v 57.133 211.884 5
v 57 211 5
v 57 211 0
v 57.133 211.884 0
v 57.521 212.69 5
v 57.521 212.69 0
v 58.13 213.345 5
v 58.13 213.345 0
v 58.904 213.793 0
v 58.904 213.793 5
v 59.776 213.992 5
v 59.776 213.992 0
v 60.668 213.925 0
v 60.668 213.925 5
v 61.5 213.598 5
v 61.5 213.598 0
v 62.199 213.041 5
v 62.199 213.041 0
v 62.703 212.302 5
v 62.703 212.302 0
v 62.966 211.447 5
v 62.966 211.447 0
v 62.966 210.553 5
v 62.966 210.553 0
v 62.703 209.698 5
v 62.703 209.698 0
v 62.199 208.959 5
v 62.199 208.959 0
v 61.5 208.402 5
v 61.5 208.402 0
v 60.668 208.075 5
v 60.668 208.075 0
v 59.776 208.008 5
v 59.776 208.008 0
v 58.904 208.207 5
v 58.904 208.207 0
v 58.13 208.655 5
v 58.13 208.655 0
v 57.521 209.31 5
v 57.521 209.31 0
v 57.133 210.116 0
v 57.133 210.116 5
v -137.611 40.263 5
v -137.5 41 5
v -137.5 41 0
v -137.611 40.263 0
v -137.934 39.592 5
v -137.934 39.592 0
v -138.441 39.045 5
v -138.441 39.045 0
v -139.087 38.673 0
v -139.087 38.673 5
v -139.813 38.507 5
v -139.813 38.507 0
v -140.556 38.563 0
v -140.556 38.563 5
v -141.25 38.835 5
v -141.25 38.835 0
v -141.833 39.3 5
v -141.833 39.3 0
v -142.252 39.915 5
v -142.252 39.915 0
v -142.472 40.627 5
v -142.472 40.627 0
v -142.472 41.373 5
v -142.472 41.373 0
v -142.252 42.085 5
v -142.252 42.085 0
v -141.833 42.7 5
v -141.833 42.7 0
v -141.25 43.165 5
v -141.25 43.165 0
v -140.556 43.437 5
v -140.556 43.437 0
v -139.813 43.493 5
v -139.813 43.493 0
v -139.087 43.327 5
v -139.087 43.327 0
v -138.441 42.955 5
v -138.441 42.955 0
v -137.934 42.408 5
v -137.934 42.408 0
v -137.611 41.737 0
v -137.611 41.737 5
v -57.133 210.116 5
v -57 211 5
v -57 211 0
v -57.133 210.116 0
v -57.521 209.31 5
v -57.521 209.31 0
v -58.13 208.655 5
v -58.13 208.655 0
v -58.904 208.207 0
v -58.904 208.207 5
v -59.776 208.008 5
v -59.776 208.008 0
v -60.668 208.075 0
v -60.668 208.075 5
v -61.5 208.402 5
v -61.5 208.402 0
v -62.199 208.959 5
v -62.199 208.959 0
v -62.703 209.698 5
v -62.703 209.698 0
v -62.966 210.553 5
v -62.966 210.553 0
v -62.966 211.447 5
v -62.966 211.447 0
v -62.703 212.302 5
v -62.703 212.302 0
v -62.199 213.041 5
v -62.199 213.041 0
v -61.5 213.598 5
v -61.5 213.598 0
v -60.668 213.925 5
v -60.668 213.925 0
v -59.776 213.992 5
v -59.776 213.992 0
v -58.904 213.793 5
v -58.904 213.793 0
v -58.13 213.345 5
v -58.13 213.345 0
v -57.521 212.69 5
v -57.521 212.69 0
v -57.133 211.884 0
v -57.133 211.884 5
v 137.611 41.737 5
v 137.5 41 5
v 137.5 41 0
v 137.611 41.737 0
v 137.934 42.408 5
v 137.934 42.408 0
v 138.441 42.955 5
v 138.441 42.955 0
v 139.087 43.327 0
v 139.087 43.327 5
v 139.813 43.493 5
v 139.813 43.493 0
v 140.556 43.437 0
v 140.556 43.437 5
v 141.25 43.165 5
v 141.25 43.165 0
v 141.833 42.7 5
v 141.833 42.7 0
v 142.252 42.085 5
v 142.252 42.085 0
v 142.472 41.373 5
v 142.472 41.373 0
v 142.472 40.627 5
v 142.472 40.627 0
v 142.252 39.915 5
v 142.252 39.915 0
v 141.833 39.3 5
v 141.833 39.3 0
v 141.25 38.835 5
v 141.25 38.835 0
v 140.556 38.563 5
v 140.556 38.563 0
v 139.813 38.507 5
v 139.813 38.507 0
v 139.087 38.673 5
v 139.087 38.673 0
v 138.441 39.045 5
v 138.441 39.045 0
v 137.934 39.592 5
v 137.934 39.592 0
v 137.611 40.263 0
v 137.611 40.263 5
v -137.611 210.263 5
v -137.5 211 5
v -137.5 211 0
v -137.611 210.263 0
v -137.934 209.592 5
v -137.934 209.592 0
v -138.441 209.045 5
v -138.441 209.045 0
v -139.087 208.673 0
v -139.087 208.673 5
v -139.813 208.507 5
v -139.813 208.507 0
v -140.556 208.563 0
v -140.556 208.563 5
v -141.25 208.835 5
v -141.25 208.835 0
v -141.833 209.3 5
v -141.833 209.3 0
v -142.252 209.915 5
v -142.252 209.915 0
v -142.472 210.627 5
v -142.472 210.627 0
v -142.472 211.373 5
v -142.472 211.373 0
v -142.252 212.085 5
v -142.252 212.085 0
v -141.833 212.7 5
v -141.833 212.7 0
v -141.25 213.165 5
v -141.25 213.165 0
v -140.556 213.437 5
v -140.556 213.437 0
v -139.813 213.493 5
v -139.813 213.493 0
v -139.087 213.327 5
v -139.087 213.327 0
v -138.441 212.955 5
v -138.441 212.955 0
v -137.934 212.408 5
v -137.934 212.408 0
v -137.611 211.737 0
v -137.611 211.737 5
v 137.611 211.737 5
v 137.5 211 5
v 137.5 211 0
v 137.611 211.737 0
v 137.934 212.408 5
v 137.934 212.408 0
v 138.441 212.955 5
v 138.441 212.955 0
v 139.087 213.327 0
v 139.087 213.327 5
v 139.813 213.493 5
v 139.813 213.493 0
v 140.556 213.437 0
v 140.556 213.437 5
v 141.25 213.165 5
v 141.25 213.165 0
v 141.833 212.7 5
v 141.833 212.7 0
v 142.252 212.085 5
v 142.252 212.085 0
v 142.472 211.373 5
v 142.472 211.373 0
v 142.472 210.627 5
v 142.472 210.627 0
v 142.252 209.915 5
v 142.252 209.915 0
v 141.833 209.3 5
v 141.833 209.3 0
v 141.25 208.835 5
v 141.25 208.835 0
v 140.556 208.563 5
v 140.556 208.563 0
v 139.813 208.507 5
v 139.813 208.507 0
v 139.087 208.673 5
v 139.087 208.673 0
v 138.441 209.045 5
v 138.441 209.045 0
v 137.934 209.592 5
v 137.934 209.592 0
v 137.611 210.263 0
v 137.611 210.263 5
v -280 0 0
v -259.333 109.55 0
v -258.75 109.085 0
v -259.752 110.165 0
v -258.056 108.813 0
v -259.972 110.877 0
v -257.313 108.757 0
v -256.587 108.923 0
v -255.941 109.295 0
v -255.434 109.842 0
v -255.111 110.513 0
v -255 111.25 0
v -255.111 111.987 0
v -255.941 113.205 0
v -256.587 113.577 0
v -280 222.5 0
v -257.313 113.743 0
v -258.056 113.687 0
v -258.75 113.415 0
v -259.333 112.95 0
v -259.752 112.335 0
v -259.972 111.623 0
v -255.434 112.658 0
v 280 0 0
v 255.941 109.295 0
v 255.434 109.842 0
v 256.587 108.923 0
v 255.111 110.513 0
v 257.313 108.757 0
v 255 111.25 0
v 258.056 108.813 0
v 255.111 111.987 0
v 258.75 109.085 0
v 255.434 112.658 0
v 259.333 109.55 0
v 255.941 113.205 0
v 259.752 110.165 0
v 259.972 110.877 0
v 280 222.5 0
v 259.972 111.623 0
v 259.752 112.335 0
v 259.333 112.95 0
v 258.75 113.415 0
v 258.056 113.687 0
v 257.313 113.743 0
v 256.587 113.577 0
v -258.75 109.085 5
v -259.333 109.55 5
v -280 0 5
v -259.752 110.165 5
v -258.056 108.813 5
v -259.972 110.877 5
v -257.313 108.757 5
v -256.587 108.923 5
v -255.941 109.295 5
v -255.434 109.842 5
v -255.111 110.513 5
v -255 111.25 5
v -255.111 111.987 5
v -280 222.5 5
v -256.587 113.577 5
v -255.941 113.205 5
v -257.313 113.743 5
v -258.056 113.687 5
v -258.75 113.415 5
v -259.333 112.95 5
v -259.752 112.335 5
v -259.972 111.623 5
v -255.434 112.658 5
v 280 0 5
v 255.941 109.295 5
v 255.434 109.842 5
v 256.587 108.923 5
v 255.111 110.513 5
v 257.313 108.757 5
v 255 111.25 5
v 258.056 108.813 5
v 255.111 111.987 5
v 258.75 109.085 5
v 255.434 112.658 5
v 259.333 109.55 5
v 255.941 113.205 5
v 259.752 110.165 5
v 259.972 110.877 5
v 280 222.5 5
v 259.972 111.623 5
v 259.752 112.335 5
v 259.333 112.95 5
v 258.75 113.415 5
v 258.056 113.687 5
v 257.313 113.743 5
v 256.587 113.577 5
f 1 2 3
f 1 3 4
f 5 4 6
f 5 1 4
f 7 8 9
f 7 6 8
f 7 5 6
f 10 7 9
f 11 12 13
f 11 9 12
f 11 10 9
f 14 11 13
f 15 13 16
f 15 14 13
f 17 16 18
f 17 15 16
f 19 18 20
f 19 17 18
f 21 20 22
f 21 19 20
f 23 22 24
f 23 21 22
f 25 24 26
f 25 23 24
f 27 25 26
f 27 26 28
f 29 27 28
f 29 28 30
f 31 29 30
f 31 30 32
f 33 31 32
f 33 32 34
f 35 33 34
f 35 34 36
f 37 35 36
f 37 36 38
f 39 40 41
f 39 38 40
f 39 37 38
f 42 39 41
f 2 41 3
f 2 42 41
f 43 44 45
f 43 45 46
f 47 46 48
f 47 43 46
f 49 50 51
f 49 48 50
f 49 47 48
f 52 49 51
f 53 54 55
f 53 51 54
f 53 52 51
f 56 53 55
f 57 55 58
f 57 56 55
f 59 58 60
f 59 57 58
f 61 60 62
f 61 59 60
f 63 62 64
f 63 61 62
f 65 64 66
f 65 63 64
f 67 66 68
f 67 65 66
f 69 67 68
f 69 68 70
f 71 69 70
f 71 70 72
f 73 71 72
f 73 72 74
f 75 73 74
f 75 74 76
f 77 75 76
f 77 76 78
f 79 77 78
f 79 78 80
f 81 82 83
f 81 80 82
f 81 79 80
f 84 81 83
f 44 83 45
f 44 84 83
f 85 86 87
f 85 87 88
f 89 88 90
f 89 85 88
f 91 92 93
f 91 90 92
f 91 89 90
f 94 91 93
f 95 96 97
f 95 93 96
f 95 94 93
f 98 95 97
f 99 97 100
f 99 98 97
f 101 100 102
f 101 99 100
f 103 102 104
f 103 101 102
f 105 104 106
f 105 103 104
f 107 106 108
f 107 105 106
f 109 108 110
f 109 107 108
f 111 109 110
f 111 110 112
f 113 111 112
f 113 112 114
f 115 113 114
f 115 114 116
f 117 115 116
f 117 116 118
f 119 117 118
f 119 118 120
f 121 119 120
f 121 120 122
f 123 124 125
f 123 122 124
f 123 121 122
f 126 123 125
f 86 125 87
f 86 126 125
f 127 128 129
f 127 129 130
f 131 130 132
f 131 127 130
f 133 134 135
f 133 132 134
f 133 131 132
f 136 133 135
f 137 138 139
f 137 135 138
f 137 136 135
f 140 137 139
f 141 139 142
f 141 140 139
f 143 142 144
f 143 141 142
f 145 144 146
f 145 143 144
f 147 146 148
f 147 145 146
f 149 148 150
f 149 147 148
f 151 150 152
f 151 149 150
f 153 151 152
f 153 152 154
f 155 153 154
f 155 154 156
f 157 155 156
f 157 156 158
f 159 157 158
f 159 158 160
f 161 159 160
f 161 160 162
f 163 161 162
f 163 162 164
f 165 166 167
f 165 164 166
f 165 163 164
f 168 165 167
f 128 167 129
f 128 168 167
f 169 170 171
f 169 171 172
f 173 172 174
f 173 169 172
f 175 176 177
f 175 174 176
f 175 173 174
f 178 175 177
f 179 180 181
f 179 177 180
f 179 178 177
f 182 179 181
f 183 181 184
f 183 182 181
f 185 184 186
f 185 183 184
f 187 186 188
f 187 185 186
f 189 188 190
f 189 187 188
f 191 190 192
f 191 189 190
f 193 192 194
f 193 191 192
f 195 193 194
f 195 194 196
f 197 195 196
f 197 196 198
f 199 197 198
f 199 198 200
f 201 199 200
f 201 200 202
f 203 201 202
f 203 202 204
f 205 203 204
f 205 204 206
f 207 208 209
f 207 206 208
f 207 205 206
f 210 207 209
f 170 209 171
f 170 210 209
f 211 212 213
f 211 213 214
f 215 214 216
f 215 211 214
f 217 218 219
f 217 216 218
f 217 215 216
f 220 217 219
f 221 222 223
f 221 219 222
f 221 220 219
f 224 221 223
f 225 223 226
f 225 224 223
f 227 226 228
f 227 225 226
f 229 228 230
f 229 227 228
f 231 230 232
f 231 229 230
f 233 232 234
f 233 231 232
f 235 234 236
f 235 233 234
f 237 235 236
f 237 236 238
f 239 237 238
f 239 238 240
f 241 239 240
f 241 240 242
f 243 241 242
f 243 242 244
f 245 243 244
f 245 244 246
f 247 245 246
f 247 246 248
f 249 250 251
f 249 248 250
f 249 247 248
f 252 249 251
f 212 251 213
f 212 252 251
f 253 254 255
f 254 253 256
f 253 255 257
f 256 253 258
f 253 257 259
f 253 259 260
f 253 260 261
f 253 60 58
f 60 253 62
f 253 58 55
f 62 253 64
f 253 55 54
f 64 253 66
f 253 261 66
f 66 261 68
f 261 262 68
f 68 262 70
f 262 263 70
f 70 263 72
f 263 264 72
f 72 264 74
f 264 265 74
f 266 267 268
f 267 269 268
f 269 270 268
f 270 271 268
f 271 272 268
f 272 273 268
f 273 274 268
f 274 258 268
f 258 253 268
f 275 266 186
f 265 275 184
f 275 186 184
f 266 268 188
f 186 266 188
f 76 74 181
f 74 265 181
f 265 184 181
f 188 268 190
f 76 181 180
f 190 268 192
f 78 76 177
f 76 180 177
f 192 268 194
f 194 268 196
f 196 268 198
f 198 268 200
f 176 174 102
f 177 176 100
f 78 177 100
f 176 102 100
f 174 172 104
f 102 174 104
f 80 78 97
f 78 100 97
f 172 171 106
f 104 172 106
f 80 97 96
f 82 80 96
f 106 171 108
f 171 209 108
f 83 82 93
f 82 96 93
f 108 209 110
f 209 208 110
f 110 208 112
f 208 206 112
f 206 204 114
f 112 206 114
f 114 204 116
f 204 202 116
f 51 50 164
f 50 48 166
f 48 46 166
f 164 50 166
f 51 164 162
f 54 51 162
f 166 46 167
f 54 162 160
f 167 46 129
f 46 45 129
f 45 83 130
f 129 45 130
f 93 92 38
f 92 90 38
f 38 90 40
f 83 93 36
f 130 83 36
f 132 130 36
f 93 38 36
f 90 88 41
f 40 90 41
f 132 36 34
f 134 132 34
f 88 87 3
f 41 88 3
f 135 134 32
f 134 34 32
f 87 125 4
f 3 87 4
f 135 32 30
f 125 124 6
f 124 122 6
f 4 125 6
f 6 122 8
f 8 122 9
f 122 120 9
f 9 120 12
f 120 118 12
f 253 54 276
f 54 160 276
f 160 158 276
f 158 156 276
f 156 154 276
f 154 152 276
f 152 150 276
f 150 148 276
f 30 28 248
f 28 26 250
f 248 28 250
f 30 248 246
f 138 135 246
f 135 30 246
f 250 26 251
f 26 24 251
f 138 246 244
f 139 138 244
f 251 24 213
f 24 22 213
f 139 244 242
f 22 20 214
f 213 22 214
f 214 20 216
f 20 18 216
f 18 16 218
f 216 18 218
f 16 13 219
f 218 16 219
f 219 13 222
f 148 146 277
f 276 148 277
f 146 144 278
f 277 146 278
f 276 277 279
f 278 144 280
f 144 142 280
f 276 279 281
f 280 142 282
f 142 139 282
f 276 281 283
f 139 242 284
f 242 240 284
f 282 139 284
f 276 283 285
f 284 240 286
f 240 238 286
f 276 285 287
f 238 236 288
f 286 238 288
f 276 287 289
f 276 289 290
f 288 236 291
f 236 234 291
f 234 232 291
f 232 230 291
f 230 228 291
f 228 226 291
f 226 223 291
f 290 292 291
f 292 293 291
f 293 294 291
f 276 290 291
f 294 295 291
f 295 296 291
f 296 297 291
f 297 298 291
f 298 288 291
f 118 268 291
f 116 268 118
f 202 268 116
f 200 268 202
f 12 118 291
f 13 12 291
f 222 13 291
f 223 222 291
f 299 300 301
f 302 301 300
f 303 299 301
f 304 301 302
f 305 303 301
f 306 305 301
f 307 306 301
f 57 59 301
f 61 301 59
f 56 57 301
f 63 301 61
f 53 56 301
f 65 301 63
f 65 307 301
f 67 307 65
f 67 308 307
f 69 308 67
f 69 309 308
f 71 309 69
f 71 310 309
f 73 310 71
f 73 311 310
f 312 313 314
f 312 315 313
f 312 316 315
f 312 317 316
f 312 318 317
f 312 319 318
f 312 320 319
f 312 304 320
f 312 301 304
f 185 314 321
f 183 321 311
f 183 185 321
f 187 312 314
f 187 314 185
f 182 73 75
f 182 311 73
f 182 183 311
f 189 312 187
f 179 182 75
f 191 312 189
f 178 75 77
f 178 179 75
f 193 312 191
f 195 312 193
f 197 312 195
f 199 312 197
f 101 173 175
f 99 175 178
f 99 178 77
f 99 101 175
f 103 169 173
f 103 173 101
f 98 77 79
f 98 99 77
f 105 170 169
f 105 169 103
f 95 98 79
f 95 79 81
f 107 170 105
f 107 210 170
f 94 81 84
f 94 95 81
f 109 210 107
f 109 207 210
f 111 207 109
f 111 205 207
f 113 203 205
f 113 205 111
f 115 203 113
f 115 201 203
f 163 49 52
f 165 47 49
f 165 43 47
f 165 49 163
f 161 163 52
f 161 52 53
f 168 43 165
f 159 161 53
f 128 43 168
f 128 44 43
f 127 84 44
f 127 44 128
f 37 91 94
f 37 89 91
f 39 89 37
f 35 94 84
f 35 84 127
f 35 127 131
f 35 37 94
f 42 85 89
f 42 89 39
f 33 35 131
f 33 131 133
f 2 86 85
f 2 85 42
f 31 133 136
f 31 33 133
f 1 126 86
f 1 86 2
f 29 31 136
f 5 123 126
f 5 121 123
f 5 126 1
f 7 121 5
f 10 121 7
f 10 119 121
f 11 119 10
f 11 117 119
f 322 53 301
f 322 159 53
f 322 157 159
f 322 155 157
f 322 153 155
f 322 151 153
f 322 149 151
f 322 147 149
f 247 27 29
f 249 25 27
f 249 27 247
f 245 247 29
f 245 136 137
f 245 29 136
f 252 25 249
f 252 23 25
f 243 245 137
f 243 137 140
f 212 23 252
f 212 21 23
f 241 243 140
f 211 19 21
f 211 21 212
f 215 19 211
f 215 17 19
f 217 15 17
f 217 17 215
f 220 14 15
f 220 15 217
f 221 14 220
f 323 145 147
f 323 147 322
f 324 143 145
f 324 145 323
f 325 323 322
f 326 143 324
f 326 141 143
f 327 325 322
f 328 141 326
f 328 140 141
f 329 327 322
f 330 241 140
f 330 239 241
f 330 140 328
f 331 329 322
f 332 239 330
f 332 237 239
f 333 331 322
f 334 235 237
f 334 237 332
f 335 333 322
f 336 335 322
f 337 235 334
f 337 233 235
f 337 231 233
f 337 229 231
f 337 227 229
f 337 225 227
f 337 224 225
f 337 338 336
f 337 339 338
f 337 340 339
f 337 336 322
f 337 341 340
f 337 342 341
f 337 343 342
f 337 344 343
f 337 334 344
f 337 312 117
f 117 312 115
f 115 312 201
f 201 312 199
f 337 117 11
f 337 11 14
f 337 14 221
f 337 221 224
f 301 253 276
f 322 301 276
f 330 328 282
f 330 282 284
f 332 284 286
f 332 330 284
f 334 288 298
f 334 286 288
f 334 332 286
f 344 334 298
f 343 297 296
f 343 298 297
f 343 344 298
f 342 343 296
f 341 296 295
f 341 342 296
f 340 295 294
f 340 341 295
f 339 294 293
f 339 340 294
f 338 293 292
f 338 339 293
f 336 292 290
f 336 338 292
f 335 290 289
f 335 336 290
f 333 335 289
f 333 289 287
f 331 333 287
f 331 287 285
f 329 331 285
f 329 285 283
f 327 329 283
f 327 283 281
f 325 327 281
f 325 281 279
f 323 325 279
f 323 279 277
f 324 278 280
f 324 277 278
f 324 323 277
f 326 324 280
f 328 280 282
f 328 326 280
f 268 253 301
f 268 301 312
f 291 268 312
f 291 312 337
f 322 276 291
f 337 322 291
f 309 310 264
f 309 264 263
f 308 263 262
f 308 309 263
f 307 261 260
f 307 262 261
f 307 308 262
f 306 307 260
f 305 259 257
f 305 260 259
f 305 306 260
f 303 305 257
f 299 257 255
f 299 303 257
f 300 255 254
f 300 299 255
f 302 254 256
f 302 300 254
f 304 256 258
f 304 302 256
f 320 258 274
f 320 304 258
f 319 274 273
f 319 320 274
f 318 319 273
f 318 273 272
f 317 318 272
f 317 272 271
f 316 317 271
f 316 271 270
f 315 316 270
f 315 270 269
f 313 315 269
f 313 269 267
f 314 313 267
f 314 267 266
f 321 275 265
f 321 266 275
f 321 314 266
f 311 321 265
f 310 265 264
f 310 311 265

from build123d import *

# Parameters (mm, degrees)
SKETCH_1_W               = 560
SKETCH_1_H               = 222.5
EXTRUDE_1_DEPTH          = 5
CUT_EXTRUDE_3_DEPTH      = 358.674782449
CUT_EXTRUDE_3_DEPTH_BACK = 358.674782449
SKETCH_4_R               = 2.5
SKETCH_4_R_2             = 3


with BuildPart() as part:
    # 草图1 → 凸台-拉伸1 (new body)
    with BuildSketch(Plane.XY):
        with Locations((0, 111.25)):
            Rectangle(SKETCH_1_W, SKETCH_1_H)
    extrude(amount=EXTRUDE_1_DEPTH)

    # 草图4 → 切除-拉伸3 (cut, two sides: drawn at the far end of the back side and taken through both)
    with BuildSketch(Plane(origin=(0, 0, 0), x_dir=(-1, 0, 0), z_dir=(0, 0, -1)).offset(-CUT_EXTRUDE_3_DEPTH_BACK)):
        with Locations((-257.5, 111.25)):
            Circle(SKETCH_4_R)
        with Locations((-60, 211)):
            Circle(SKETCH_4_R_2)
        with Locations((-140, 211)):
            Circle(SKETCH_4_R)
        with Locations((-140, 41)):
            Circle(SKETCH_4_R)
        with Locations(Location((257.5, 111.25, 0), (0, 0, 180))):
            Circle(SKETCH_4_R)
        with Locations(Location((140, 211, 0), (0, 0, 180))):
            Circle(SKETCH_4_R)
        with Locations(Location((60, 211, 0), (0, 0, 180))):
            Circle(SKETCH_4_R_2)
        with Locations(Location((140, 41, 0), (0, 0, 180))):
            Circle(SKETCH_4_R)
    extrude(amount=CUT_EXTRUDE_3_DEPTH + CUT_EXTRUDE_3_DEPTH_BACK, mode=Mode.SUBTRACT)


solid = part.part
